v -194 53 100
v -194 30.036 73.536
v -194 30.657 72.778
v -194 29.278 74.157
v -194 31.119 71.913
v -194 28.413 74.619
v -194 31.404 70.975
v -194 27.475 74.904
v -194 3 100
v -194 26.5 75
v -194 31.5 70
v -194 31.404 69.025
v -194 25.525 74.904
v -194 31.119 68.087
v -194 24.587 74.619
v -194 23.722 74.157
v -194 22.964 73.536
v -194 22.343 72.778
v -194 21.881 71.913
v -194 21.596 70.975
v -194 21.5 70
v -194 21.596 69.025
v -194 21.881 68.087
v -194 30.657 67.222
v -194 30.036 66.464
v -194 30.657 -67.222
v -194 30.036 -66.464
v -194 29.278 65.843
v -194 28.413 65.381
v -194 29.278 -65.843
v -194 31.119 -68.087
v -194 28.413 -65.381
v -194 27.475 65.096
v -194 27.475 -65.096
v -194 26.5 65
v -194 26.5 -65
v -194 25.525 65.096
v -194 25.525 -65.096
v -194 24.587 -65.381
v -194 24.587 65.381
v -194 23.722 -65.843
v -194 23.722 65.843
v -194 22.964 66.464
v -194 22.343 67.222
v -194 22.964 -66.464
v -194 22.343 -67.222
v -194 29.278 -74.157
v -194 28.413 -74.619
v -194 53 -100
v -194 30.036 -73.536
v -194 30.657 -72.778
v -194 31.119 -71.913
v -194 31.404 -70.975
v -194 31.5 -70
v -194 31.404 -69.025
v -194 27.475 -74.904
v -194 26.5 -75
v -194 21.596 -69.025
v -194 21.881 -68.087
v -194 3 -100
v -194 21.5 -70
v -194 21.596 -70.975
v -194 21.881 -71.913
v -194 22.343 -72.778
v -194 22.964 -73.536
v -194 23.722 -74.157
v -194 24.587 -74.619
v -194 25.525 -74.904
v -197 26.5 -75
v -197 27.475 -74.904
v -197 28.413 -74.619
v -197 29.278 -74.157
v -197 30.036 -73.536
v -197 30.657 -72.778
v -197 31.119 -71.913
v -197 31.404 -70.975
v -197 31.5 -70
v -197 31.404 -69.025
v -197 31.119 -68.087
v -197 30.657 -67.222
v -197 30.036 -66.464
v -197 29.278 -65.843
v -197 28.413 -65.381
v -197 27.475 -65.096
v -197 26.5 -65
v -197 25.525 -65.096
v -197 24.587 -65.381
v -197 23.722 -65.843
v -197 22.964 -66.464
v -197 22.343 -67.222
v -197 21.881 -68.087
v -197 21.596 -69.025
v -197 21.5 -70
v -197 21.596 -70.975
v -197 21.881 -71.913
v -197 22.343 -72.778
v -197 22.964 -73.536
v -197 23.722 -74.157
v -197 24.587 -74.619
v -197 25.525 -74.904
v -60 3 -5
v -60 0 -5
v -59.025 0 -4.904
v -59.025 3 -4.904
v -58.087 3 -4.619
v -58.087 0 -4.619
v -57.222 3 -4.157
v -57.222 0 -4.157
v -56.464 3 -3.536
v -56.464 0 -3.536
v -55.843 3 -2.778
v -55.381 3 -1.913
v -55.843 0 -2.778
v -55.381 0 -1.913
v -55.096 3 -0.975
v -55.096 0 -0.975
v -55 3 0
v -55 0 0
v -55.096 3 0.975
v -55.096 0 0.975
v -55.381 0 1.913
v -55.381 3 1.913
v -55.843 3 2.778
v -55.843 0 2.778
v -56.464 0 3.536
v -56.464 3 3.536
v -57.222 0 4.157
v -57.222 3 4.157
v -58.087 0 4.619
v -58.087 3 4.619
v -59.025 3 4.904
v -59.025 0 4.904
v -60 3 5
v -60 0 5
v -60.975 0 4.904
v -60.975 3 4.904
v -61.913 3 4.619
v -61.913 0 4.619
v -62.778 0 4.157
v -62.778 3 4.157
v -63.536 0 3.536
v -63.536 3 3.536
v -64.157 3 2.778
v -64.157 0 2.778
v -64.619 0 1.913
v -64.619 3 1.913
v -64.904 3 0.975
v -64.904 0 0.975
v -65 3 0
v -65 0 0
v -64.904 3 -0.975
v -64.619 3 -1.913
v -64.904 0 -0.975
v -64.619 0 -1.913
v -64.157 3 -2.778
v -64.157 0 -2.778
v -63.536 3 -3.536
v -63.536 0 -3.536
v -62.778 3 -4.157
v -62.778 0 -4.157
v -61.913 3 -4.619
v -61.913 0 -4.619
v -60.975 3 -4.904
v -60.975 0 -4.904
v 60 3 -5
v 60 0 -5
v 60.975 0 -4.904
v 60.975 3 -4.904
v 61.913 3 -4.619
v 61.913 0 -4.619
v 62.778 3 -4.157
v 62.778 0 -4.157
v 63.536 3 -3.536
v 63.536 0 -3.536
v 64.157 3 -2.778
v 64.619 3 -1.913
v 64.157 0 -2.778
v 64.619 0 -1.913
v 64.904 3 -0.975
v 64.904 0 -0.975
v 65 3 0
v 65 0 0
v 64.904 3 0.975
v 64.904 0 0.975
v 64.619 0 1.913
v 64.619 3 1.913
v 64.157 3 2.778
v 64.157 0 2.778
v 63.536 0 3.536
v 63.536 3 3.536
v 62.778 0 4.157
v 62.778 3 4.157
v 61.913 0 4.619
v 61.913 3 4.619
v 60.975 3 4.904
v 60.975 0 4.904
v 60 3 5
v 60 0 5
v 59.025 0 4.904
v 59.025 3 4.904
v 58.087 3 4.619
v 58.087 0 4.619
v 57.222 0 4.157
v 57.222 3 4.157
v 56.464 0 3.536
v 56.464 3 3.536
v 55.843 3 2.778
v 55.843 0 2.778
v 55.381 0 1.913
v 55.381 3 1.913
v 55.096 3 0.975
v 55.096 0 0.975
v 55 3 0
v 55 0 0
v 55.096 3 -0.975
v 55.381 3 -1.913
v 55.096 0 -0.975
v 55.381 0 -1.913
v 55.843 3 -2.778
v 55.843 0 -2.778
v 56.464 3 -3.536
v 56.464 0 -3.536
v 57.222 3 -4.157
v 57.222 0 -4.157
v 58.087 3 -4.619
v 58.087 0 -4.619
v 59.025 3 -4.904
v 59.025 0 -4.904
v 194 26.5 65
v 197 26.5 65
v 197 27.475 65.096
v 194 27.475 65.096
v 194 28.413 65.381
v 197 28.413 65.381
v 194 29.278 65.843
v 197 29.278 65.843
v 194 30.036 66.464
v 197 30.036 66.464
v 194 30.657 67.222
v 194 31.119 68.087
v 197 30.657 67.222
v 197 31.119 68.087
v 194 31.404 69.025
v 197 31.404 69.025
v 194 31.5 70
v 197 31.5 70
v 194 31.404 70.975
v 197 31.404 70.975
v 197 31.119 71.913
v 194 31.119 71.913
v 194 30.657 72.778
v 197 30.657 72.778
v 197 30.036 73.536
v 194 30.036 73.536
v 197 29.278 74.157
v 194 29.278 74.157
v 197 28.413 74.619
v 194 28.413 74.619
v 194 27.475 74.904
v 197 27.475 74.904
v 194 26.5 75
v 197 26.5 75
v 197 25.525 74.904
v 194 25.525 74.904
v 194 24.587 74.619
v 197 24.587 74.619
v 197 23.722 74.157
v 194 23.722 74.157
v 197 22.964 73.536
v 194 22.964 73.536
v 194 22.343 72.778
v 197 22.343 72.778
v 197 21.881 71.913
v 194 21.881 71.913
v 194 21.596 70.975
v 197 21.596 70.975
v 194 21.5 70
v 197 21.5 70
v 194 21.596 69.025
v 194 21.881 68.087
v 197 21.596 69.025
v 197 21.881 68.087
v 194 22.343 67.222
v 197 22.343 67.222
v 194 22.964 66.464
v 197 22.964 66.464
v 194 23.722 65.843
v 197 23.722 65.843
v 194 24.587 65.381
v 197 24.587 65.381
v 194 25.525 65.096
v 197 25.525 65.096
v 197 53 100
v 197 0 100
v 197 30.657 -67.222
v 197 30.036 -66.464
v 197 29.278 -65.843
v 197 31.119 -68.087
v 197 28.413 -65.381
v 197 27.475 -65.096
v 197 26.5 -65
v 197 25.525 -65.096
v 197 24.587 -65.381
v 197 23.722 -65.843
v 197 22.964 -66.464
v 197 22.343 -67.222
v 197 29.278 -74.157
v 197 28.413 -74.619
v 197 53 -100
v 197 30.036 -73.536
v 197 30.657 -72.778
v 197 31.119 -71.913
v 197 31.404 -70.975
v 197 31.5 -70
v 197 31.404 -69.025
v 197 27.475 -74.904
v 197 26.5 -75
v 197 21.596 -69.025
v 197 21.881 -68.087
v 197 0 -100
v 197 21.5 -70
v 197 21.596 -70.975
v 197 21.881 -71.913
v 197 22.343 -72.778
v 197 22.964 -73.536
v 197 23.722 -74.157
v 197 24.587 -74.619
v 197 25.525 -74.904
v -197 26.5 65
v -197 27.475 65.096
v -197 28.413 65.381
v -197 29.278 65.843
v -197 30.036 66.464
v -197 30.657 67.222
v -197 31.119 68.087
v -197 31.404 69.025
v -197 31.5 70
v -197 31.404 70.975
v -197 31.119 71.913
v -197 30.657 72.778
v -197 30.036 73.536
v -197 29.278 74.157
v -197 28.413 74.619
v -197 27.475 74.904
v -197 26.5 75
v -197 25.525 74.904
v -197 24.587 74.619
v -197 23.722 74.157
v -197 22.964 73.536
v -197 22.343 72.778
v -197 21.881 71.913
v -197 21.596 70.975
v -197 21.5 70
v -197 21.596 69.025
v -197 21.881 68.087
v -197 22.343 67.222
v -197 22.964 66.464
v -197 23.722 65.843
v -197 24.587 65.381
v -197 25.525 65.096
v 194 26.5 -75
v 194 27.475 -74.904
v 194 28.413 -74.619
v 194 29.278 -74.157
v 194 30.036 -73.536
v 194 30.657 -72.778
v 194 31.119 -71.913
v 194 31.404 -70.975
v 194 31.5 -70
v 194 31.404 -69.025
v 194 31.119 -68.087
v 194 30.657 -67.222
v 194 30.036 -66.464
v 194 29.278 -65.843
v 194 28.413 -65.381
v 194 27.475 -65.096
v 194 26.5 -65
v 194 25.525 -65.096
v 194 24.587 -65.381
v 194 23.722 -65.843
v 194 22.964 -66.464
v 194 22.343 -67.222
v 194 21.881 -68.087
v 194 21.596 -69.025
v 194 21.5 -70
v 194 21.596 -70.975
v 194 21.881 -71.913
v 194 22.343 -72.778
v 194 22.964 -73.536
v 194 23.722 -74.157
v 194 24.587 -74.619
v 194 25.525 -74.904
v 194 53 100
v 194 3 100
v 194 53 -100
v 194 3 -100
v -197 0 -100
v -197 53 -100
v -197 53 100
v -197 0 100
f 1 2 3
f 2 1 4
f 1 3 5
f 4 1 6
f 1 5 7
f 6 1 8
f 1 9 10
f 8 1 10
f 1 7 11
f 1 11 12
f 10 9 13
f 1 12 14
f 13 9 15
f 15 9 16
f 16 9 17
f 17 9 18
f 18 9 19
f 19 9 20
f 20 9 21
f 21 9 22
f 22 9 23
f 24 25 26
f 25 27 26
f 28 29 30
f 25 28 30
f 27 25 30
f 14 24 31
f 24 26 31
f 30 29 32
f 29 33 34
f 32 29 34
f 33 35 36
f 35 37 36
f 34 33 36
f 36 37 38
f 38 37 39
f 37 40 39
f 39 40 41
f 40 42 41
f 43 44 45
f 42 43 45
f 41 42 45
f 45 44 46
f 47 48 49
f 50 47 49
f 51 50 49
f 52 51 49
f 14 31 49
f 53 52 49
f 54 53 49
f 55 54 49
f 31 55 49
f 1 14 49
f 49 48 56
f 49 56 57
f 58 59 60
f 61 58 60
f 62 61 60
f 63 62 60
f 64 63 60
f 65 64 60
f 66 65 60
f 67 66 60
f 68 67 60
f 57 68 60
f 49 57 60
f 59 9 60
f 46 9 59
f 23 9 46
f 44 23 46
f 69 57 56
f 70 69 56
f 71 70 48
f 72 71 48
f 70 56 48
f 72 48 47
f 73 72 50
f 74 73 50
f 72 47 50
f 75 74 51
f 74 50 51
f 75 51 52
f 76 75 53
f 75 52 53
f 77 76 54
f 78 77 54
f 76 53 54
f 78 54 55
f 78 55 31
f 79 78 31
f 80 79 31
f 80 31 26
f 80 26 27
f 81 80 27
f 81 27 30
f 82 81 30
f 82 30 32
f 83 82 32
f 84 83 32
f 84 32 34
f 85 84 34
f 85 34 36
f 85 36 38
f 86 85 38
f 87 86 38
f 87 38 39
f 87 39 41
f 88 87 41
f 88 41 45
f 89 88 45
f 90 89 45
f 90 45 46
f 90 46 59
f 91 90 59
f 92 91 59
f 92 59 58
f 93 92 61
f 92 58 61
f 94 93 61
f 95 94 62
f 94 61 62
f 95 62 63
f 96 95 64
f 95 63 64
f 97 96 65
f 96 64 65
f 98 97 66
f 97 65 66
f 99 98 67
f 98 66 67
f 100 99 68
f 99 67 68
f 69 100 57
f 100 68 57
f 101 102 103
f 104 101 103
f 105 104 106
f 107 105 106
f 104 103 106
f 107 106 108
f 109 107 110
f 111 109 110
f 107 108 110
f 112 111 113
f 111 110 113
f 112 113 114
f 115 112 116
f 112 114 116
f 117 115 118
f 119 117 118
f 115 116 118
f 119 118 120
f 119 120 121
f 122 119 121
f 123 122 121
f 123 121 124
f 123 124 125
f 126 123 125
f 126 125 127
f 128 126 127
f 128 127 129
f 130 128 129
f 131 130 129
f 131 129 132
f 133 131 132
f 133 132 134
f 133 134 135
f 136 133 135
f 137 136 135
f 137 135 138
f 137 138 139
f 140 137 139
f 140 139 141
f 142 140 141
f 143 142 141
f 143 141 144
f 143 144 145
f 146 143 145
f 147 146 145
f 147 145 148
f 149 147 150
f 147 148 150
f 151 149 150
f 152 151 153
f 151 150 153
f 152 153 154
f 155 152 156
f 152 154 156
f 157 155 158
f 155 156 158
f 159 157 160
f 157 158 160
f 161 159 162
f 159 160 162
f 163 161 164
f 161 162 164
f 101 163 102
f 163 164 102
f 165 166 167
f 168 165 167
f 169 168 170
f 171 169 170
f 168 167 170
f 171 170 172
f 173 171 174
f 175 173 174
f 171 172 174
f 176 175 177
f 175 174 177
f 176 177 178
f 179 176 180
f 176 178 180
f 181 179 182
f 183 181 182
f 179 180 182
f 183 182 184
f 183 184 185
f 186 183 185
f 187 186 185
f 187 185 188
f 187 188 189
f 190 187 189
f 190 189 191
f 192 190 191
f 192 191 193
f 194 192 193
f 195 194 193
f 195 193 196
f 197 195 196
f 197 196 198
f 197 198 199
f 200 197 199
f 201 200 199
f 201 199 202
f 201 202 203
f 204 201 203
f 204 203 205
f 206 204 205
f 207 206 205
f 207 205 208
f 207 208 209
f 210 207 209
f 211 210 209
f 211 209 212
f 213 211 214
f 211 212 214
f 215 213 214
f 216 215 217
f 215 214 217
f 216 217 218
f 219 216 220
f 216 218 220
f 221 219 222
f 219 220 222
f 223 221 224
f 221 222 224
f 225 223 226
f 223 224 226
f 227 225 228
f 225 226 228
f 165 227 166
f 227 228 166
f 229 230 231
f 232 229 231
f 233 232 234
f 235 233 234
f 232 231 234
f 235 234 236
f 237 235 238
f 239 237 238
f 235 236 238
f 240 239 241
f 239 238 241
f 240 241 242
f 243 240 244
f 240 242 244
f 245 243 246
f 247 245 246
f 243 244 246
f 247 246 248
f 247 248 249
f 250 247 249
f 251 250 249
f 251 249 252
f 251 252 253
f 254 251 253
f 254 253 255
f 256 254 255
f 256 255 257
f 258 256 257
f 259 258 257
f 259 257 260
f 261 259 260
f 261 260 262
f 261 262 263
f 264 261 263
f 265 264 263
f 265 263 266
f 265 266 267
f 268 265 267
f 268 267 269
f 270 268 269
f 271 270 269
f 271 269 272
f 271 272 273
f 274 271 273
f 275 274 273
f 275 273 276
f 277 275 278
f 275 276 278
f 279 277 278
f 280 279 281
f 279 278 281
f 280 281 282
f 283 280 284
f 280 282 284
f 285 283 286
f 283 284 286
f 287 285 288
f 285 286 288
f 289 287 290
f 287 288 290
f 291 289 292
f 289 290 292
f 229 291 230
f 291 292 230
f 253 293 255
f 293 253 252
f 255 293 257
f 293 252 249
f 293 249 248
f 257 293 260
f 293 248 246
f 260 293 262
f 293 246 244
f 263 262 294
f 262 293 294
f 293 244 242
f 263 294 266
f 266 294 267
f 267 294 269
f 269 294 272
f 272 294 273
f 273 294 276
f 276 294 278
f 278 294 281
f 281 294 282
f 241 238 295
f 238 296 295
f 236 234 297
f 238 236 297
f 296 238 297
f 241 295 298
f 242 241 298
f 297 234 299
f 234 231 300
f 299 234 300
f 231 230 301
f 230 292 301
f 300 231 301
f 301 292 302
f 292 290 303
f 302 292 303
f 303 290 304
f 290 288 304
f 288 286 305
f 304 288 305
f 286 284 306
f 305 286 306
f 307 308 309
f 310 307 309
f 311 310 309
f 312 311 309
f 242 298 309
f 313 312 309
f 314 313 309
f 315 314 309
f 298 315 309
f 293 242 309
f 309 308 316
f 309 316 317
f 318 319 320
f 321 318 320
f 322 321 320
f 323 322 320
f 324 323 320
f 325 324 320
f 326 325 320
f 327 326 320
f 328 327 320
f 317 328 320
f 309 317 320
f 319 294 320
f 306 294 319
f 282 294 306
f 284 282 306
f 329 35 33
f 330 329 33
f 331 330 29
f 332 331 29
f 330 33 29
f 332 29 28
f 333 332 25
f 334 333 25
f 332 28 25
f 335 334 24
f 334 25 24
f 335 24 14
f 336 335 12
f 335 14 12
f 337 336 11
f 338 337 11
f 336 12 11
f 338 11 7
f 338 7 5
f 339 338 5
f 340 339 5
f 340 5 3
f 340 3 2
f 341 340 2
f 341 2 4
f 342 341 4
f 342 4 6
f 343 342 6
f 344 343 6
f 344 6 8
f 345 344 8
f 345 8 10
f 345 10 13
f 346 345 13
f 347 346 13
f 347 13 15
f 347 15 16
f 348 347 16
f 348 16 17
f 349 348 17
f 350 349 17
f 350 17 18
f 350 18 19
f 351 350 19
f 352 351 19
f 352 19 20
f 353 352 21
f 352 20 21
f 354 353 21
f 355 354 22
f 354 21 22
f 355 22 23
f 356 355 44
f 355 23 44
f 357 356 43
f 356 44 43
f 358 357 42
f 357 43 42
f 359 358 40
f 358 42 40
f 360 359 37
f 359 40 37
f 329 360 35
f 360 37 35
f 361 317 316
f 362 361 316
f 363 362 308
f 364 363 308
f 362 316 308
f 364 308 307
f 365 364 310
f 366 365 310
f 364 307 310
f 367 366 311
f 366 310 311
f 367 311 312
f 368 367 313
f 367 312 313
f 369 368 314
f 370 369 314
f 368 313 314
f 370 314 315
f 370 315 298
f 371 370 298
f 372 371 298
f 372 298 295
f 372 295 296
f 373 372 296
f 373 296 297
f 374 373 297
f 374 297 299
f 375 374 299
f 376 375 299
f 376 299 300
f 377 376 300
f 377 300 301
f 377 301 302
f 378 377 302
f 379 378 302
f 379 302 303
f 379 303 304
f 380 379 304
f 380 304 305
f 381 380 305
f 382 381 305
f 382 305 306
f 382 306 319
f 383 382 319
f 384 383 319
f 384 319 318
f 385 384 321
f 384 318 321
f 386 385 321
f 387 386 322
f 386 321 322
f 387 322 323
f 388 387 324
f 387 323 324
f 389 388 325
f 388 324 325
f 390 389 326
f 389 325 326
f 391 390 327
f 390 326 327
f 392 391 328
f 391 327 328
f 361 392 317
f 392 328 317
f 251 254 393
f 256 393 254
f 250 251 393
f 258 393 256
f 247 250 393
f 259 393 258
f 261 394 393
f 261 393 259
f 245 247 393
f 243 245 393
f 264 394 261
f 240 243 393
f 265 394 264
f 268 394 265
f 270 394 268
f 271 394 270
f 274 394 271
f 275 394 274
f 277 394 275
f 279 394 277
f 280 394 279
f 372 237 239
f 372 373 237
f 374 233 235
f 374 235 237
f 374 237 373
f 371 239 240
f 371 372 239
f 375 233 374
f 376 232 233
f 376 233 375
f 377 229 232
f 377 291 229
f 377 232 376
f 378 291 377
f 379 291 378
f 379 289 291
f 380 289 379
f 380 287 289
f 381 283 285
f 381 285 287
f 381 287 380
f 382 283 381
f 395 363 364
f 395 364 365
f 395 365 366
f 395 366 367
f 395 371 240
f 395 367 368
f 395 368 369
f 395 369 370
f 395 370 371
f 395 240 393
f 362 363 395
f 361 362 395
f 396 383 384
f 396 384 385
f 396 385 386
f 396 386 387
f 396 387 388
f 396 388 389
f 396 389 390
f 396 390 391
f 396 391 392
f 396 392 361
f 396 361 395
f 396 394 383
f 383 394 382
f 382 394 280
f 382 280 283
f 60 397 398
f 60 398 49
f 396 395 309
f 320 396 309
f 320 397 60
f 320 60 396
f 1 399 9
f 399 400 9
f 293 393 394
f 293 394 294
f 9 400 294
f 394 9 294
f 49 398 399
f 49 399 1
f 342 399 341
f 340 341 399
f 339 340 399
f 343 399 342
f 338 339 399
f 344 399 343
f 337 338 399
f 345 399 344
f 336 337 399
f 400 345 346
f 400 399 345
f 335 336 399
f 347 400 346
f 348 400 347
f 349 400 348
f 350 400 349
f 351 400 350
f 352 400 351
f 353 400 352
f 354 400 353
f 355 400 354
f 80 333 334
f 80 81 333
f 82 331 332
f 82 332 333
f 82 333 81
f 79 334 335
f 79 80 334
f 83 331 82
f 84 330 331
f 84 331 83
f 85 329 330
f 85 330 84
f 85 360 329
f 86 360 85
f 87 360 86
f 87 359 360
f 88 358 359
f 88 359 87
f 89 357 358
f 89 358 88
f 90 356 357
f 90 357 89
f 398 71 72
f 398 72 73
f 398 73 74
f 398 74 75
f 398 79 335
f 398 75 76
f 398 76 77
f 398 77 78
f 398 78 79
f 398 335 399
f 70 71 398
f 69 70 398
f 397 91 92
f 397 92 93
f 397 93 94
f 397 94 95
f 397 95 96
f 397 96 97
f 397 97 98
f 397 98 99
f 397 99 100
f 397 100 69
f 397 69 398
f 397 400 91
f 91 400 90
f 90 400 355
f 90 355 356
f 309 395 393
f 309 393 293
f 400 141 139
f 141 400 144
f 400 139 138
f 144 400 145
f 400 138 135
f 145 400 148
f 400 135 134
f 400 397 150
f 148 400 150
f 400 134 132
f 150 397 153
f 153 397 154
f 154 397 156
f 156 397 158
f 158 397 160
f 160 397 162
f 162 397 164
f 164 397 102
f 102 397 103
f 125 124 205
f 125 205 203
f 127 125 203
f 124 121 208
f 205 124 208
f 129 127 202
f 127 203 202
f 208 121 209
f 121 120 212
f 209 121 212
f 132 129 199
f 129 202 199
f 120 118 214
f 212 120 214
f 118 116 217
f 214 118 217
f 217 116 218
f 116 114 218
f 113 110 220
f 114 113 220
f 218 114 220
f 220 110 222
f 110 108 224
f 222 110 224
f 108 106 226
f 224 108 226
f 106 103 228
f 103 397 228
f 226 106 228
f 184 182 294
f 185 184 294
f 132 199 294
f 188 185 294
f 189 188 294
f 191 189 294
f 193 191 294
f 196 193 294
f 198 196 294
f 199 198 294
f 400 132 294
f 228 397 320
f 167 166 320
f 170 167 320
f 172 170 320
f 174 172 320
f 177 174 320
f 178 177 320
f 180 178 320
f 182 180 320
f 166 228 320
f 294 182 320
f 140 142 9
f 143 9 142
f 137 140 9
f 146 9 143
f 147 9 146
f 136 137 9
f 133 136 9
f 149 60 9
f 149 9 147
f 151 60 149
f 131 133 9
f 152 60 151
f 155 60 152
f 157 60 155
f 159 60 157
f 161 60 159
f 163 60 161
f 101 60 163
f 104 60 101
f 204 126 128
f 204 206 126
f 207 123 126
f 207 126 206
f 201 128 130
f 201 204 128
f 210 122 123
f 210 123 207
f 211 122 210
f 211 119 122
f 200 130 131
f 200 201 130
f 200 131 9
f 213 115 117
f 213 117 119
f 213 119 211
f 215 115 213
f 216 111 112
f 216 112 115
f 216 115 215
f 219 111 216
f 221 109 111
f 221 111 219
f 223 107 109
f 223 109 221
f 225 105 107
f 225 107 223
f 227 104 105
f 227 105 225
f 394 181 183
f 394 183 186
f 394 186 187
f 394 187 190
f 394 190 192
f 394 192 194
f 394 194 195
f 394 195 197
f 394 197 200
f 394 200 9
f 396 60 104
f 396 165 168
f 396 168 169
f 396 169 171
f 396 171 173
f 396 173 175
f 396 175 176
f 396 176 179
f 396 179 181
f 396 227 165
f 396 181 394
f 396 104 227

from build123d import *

# Parameters (mm, degrees)
SKETCH1_W           = 394
SKETCH1_H           = 200
BOSS_EXTRUDE1_DEPTH = 3
SKETCH2_W           = 3
SKETCH2_H           = 200
BOSS_EXTRUDE2_DEPTH = 50
SKETCH3_R           = 5
CUT_EXTRUDE1_DEPTH  = 410.932921342
SKETCH4_R           = 5
CUT_EXTRUDE2_DEPTH  = 228.195950668


with BuildPart() as part:
    # Sketch1 → Boss-Extrude1 (new body)
    with BuildSketch(Plane(origin=(0, 0, 0), x_dir=(1, 0, 0), z_dir=(0, 1, 0))):
        Rectangle(SKETCH1_W, SKETCH1_H)
    extrude(amount=BOSS_EXTRUDE1_DEPTH)

    # Sketch2 → Boss-Extrude2 (add)
    with BuildSketch(Plane(origin=(0, 3, 0), x_dir=(1, 0, 0), z_dir=(0, 1, 0))):
        with Locations((-195.5, 0)):
            Rectangle(SKETCH2_W, SKETCH2_H)
        with Locations((195.5, 0)):
            Rectangle(SKETCH2_W, SKETCH2_H)
    extrude(amount=BOSS_EXTRUDE2_DEPTH)

    # Sketch3 → Cut-Extrude1 (cut, through all)
    with BuildSketch(Plane(origin=(197, 0, 0), x_dir=(0, 0, -1), z_dir=(1, 0, 0))):
        with Locations((70, 26.5)):
            Circle(SKETCH3_R)
        with Locations((-70, 26.5)):
            Circle(SKETCH3_R)
    extrude(amount=-CUT_EXTRUDE1_DEPTH, mode=Mode.SUBTRACT)

    # Sketch4 → Cut-Extrude2 (cut, through all)
    with BuildSketch(Plane.XZ):
        with Locations(Location((60, 0, 0), (0, 0, 270))):
            Circle(SKETCH4_R)
        with Locations(Location((-60, 0, 0), (0, 0, 270))):
            Circle(SKETCH4_R)
    extrude(amount=-CUT_EXTRUDE2_DEPTH, mode=Mode.SUBTRACT)


solid = part.part
